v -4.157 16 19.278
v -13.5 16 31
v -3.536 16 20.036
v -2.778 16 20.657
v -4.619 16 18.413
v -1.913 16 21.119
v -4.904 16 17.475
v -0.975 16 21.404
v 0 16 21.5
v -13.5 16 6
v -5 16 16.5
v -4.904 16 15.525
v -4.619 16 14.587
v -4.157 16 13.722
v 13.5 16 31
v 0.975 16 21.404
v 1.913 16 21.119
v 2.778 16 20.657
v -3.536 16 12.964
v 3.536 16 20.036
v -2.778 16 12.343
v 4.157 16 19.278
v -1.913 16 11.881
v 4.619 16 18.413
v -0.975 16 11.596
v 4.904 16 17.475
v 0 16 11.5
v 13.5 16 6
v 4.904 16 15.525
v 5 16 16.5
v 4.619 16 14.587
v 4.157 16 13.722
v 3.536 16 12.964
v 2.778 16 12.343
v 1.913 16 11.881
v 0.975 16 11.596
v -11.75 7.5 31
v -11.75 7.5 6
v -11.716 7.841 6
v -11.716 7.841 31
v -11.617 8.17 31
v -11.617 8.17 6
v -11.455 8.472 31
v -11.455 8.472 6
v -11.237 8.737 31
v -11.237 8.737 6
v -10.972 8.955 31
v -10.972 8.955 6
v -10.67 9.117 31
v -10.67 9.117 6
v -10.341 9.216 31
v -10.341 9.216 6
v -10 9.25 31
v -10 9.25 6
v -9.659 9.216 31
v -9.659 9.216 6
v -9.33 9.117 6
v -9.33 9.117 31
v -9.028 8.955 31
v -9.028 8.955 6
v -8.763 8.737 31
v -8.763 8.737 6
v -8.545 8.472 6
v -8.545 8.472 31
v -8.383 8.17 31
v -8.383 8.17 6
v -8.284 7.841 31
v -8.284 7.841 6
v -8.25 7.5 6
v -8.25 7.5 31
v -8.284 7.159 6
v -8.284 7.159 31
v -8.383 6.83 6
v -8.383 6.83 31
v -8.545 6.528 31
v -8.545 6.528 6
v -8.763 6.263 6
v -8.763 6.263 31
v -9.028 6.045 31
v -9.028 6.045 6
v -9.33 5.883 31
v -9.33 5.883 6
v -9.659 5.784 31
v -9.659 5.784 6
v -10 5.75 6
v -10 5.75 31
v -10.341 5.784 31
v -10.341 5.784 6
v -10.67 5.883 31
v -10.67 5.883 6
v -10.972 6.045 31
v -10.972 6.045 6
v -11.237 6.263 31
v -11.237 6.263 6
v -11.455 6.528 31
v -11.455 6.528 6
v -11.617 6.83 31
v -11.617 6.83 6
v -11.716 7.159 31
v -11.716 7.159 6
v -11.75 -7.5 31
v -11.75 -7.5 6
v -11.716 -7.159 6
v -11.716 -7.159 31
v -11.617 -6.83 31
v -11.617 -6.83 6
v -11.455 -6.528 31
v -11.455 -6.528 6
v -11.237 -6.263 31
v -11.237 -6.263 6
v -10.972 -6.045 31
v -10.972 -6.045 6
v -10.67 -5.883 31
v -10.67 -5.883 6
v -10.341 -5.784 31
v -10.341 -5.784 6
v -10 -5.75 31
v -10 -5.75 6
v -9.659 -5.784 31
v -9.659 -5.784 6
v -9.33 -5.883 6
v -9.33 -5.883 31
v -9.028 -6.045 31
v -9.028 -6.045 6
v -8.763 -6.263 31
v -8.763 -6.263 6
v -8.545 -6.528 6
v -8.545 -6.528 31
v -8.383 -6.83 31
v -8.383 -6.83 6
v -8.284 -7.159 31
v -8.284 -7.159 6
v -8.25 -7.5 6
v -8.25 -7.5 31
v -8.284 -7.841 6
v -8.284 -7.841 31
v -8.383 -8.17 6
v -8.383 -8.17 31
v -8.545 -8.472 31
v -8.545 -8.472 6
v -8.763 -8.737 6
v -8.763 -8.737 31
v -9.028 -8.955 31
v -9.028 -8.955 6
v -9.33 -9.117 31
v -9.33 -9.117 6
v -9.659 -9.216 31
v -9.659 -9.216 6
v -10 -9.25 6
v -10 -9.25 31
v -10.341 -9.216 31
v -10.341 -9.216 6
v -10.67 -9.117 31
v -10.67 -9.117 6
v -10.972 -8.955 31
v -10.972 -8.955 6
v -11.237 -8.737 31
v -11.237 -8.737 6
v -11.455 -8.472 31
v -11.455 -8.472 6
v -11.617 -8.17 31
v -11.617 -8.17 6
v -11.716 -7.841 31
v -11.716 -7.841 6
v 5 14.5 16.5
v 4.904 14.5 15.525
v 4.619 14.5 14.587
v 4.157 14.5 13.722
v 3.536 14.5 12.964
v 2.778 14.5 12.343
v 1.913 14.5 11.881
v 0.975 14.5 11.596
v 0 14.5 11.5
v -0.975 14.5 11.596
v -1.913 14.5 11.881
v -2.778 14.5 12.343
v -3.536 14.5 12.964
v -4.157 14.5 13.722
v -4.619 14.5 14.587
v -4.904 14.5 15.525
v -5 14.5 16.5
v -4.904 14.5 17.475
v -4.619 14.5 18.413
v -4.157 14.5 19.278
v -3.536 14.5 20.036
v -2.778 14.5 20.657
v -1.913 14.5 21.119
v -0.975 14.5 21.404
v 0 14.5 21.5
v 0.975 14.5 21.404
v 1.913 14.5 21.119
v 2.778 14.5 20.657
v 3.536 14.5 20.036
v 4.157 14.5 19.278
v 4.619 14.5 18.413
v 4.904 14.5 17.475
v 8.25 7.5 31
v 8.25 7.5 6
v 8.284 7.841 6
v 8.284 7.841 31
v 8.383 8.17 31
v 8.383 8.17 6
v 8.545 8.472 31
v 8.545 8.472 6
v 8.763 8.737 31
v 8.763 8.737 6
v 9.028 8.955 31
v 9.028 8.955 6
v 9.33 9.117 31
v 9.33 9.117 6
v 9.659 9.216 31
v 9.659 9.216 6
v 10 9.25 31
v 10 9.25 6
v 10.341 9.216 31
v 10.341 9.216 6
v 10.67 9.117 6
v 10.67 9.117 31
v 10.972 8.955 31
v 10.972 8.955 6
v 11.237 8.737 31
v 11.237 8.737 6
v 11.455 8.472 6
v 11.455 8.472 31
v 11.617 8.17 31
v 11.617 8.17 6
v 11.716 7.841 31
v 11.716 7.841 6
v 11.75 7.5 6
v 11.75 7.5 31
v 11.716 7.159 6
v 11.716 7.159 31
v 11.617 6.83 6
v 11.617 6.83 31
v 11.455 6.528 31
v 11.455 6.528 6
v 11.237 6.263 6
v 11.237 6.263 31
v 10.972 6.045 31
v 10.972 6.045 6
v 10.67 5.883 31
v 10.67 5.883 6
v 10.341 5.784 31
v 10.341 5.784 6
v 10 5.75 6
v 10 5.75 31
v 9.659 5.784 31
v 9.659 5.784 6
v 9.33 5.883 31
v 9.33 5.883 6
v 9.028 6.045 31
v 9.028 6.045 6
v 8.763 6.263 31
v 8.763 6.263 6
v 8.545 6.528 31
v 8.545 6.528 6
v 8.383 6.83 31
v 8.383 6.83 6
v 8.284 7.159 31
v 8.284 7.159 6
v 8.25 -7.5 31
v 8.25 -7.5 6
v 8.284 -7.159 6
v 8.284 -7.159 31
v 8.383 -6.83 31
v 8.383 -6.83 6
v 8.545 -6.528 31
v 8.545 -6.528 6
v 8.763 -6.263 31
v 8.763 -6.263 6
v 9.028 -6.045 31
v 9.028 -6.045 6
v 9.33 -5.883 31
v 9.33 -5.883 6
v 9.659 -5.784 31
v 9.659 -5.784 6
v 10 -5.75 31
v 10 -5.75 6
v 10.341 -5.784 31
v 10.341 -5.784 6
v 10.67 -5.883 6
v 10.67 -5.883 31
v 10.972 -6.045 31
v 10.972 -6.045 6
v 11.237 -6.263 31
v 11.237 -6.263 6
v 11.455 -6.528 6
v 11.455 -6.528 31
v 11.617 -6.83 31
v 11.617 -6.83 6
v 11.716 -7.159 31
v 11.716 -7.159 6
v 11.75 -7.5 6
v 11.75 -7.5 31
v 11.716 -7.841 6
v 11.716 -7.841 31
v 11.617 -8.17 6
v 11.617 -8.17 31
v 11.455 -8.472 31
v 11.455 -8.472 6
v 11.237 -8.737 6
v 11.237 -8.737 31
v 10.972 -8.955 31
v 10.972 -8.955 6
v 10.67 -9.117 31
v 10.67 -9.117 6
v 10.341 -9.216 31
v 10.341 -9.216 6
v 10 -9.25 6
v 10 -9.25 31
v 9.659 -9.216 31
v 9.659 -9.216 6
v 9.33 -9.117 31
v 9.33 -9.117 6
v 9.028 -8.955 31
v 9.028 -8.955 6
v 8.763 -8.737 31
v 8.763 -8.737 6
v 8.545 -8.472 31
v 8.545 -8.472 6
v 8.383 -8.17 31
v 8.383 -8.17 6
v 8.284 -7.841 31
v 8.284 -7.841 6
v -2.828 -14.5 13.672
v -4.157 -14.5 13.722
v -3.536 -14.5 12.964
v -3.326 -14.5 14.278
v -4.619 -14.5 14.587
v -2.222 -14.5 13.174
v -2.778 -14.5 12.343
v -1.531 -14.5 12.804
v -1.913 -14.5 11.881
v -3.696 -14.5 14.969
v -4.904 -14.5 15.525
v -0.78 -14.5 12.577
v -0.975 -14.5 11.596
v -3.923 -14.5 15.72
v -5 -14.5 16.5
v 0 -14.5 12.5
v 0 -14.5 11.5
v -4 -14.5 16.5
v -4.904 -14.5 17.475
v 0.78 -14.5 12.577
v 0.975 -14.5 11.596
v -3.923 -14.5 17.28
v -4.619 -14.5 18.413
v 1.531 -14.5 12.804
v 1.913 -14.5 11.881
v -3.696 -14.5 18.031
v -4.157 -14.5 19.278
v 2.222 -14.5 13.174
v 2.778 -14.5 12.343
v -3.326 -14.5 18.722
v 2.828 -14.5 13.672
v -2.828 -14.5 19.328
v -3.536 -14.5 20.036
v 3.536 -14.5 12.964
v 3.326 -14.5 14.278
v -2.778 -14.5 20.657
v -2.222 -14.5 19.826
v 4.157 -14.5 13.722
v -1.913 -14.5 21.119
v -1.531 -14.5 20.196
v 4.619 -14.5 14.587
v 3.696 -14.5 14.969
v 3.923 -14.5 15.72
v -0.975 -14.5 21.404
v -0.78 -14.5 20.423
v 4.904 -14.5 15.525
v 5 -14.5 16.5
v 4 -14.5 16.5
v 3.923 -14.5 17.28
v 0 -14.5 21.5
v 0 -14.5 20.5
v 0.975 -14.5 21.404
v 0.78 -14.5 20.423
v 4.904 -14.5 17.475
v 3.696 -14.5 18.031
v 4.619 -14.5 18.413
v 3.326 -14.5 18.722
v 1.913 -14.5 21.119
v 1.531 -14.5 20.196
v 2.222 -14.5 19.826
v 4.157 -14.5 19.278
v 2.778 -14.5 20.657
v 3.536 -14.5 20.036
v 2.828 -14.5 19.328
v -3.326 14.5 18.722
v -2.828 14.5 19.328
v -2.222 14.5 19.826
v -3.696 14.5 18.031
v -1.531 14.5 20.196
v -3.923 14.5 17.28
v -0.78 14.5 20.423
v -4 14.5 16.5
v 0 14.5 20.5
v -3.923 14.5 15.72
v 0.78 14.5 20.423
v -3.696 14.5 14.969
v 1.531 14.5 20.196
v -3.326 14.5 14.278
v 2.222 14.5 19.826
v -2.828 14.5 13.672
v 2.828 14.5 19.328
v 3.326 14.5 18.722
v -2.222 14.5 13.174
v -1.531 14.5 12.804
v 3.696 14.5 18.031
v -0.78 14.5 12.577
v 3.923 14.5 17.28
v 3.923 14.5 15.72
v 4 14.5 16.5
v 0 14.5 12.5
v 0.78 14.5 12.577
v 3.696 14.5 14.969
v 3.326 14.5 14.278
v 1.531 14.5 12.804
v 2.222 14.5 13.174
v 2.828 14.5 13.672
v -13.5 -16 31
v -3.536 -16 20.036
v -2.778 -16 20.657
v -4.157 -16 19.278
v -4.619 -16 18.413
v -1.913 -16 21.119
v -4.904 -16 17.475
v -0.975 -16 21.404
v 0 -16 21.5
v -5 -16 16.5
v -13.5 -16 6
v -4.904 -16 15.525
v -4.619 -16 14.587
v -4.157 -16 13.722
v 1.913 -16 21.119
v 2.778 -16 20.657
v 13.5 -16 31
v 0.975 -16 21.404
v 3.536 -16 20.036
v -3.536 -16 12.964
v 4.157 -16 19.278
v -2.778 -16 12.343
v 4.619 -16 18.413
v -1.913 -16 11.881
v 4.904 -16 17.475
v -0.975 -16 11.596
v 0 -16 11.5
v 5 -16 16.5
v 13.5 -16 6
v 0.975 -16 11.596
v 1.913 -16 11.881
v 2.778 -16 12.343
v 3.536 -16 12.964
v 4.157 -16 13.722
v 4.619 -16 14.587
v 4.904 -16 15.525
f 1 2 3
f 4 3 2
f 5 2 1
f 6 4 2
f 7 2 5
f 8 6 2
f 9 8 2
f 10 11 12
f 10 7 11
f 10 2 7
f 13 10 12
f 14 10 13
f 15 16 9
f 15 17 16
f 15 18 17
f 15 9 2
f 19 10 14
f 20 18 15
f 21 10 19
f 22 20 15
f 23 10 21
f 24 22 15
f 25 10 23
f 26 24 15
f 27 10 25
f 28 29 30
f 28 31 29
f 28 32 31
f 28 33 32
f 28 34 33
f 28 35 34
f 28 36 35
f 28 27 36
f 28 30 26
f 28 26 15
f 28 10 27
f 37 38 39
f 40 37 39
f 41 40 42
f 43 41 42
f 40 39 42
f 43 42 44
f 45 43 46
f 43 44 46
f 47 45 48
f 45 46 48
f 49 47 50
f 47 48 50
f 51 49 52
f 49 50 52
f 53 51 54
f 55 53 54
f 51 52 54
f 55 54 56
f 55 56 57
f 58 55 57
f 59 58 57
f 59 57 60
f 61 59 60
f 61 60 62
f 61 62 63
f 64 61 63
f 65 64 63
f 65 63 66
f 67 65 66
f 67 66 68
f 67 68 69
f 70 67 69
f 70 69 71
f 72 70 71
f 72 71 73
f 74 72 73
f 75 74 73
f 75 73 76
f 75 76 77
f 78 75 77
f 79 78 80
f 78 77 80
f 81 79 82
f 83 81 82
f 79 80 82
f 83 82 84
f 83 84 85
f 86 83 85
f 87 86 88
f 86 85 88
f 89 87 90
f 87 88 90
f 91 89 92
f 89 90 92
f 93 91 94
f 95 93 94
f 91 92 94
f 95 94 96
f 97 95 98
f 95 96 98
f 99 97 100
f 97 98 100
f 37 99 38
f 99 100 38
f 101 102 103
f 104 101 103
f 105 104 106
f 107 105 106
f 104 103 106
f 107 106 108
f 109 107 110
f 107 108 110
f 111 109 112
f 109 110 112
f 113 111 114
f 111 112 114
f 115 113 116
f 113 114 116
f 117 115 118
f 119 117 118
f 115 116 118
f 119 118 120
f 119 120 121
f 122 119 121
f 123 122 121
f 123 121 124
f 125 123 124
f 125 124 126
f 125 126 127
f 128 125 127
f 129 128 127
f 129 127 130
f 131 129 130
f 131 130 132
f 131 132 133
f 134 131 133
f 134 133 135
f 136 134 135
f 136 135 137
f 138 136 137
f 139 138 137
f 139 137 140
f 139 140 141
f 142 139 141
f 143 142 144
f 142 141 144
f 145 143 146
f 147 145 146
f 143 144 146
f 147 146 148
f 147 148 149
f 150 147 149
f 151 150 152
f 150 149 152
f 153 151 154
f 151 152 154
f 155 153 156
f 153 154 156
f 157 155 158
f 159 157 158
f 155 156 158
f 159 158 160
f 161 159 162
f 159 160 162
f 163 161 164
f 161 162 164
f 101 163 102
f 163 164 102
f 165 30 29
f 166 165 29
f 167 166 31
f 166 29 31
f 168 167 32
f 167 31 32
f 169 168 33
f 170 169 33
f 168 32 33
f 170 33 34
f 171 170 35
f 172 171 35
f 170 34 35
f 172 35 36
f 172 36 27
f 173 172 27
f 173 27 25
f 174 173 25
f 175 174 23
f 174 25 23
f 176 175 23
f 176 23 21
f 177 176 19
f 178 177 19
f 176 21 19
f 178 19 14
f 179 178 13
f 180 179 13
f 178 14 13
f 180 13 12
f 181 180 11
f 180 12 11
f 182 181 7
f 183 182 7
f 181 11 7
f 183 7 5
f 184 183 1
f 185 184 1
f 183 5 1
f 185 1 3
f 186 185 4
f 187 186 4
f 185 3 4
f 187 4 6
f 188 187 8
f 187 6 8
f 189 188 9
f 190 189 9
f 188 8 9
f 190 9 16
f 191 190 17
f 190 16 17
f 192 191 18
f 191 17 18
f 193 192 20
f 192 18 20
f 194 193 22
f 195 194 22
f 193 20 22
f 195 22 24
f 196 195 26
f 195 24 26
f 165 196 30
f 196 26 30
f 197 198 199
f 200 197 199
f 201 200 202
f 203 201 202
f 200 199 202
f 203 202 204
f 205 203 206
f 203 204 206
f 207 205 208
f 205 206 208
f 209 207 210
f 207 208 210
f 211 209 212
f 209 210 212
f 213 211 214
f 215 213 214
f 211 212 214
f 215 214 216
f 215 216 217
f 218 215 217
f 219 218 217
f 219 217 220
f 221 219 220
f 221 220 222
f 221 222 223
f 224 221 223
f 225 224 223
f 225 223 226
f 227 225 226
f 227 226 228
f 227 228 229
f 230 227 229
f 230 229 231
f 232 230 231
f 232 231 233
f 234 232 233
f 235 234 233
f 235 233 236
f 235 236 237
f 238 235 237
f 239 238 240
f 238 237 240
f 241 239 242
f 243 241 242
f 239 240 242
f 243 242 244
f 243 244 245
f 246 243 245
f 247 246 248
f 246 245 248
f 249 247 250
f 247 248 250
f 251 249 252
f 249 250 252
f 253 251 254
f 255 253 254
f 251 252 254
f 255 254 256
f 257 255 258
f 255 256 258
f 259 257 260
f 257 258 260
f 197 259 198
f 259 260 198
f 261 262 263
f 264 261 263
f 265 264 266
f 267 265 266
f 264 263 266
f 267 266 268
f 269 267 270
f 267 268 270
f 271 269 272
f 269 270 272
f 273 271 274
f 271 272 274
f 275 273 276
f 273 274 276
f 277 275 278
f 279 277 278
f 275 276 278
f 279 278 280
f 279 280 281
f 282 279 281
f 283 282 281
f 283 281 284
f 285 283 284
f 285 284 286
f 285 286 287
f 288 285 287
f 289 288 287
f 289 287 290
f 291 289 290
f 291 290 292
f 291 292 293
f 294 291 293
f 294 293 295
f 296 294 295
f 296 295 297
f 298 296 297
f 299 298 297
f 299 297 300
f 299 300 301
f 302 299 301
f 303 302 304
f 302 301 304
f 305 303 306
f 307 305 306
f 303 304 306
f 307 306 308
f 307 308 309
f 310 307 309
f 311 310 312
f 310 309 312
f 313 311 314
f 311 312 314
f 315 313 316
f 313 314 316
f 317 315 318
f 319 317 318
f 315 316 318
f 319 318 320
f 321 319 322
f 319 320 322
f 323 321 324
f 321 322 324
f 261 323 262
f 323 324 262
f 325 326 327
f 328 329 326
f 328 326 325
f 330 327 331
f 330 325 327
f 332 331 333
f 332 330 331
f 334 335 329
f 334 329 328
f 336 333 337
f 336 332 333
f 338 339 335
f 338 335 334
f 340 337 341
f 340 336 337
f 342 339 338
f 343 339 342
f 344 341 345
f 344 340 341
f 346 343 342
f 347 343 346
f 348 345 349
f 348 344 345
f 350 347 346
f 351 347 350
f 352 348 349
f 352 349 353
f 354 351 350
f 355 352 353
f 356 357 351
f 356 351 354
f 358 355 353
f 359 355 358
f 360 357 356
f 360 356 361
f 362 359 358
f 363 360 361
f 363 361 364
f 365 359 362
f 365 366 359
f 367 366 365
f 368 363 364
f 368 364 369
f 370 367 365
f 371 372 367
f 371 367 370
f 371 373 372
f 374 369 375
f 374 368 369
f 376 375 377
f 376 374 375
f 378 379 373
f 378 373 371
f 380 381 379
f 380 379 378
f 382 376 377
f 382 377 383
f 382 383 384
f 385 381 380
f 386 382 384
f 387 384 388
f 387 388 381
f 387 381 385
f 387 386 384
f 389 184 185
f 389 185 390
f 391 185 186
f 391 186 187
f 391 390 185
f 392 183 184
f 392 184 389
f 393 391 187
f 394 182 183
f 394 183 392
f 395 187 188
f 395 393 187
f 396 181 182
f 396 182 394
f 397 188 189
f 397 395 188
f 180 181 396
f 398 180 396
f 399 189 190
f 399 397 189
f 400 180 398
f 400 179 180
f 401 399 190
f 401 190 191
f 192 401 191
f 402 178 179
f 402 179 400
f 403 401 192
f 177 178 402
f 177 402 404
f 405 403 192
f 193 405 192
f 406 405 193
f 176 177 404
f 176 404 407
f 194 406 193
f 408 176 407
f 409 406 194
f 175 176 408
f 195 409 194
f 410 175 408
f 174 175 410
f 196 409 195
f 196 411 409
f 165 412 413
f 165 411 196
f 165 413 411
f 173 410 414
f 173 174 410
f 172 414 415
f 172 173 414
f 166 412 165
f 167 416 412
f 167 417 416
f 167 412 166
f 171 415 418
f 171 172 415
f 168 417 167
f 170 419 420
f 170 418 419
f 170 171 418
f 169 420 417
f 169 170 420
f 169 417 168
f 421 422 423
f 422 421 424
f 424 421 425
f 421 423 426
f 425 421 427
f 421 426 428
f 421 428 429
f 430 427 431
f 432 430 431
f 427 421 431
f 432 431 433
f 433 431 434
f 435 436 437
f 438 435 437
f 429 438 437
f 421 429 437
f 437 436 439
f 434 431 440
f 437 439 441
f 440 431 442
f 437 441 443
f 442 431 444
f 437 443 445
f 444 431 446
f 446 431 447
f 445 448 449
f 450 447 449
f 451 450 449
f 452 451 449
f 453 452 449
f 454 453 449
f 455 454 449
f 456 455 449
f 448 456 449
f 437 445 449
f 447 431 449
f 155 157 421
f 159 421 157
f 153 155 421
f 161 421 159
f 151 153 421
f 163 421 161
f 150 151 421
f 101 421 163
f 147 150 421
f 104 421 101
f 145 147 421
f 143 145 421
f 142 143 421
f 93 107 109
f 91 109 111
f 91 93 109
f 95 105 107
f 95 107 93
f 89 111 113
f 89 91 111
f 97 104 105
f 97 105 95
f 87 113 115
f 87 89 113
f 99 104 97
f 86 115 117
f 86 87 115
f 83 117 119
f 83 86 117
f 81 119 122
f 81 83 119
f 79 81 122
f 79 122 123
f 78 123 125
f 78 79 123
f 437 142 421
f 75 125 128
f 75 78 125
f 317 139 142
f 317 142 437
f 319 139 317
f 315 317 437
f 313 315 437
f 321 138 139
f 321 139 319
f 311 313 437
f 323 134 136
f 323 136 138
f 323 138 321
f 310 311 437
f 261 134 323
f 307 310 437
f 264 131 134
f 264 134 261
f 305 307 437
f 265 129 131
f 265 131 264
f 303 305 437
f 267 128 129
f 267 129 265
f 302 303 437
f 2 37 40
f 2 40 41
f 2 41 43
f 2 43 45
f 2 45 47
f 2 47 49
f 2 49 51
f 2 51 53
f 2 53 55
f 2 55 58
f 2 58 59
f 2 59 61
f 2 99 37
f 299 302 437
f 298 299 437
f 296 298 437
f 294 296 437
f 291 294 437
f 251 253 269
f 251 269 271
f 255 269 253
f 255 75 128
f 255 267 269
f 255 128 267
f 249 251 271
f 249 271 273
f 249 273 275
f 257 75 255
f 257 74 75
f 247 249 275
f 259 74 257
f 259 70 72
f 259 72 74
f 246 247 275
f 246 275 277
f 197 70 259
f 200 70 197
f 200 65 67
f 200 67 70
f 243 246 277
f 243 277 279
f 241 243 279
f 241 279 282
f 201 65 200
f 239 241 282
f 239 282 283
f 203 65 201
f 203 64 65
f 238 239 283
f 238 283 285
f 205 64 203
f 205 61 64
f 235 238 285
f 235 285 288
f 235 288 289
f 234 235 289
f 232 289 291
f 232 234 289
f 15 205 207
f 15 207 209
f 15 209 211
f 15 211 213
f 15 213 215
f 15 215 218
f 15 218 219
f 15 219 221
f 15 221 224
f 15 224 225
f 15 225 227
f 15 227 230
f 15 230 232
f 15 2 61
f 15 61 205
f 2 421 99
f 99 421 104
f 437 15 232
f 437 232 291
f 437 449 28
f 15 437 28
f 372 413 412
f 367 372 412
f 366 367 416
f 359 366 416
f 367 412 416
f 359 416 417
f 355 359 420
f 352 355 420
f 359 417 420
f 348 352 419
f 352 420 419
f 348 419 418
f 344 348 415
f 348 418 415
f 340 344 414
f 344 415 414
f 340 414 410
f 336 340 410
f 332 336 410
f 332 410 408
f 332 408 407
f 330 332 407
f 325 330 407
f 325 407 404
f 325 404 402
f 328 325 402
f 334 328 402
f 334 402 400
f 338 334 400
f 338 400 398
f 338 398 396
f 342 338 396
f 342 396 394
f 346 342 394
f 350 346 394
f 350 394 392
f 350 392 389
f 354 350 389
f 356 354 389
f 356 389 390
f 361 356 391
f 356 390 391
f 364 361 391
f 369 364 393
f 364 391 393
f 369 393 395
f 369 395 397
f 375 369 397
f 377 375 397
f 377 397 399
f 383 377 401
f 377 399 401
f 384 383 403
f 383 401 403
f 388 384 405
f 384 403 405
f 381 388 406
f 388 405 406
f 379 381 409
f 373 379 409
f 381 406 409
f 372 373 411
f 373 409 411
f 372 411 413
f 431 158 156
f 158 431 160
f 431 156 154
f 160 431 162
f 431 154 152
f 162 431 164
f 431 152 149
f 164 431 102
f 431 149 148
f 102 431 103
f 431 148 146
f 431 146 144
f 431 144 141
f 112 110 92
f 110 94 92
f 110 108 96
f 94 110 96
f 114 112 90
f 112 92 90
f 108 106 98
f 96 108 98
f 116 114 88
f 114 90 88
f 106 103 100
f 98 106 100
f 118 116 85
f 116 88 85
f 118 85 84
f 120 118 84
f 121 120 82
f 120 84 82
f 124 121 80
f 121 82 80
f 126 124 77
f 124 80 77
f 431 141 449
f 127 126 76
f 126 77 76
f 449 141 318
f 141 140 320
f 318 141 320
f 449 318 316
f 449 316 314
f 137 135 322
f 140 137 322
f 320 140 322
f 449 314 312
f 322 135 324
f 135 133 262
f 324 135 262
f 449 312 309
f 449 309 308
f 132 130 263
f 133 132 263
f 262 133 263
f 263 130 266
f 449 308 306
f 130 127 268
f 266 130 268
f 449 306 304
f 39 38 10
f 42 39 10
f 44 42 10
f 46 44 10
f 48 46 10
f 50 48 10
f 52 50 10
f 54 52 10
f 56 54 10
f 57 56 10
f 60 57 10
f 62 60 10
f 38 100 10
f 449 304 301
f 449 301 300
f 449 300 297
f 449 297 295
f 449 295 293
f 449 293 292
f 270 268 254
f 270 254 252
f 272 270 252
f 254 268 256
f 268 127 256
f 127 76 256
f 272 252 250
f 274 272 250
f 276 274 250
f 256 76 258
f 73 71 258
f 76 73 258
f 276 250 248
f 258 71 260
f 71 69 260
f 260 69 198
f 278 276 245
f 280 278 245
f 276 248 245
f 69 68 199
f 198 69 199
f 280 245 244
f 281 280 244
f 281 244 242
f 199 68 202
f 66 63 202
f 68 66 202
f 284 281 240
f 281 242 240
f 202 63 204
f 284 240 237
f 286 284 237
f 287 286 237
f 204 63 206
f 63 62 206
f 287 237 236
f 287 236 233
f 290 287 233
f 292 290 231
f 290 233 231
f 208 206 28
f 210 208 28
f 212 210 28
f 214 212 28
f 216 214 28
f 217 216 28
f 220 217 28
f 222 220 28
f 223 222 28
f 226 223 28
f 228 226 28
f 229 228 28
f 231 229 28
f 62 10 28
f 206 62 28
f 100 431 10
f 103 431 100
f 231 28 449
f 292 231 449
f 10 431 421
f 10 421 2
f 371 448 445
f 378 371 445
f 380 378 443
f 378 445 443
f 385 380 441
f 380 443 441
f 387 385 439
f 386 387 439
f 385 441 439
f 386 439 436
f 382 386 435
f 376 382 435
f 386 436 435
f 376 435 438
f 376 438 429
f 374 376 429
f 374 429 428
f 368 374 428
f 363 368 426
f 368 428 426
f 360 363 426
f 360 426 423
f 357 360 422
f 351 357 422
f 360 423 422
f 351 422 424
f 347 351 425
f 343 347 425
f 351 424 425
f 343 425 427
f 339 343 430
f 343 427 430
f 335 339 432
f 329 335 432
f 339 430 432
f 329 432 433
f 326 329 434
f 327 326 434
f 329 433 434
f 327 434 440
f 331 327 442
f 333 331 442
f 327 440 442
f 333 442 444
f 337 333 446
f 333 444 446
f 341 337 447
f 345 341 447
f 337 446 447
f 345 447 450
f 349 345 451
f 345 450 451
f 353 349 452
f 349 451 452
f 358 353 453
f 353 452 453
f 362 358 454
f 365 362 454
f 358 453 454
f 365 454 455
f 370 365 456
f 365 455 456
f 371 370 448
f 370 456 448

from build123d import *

# Parameters (mm, degrees)
SCHIZZO1_W                   = 27
SCHIZZO1_H                   = 32
ESTRUSIONE_ESTRUSIONE1_DEPTH = 31
SCHIZZO2_R                   = 1.75
TAGLIO_ESTRUSIONE1_DEPTH     = 32
SCHIZZO8_OUTSIDE_W           = 39.42
SCHIZZO8_OUTSIDE_H           = 43.42
SCHIZZO8_OUTSIDE_W_2         = 27
SCHIZZO8_OUTSIDE_H_2         = 25
TAGLIO_ESTRUSIONE7_DEPTH     = 33
SCHIZZO10_R                  = 5
TAGLIO_ESTRUSIONE8_DEPTH     = 1.5
SCHIZZO11_R                  = 4
TAGLIO_ESTRUSIONE9_DEPTH     = 33
SCHIZZO12_R                  = 5
TAGLIO_ESTRUSIONE10_DEPTH    = 1.5


with BuildPart() as part:
    # Schizzo1 → Estrusione-Estrusione1 (new body)
    with BuildSketch(Plane.XY):
        Rectangle(SCHIZZO1_W, SCHIZZO1_H)
    extrude(amount=ESTRUSIONE_ESTRUSIONE1_DEPTH)

    # Schizzo2 → Taglio-Estrusione1 (cut, through all)
    with BuildSketch(Plane(origin=(0, 0, 0), x_dir=(-1, 0, 0), z_dir=(0, 0, -1))):
        with Locations((-10, 7.5)):
            Circle(SCHIZZO2_R)
        with Locations((10, 7.5)):
            Circle(SCHIZZO2_R)
        with Locations((10, -7.5)):
            Circle(SCHIZZO2_R)
        with Locations((-10, -7.5)):
            Circle(SCHIZZO2_R)
    extrude(amount=-TAGLIO_ESTRUSIONE1_DEPTH, mode=Mode.SUBTRACT)

    # Schizzo8 outside → Taglio-Estrusione7 (cut, through all)
    with BuildSketch(Plane(origin=(0, 16, 0), x_dir=(1, 0, 0), z_dir=(0, 1, 0))):
        with Locations((0, -15.5)):
            Rectangle(SCHIZZO8_OUTSIDE_W, SCHIZZO8_OUTSIDE_H)
        with Locations((0, -18.5)):
            Rectangle(SCHIZZO8_OUTSIDE_W_2, SCHIZZO8_OUTSIDE_H_2, mode=Mode.SUBTRACT)
    extrude(amount=-TAGLIO_ESTRUSIONE7_DEPTH, mode=Mode.SUBTRACT)

    # Schizzo10 → Taglio-Estrusione8 (cut)
    with BuildSketch(Plane(origin=(0, 16, 0), x_dir=(1, 0, 0), z_dir=(0, 1, 0))):
        with Locations((0, -16.5)):
            Circle(SCHIZZO10_R)
    extrude(amount=-TAGLIO_ESTRUSIONE8_DEPTH, mode=Mode.SUBTRACT)

    # Schizzo11 → Taglio-Estrusione9 (cut, through all)
    with BuildSketch(Plane(origin=(0, 16, 0), x_dir=(1, 0, 0), z_dir=(0, 1, 0))):
        with Locations((0, -16.5)):
            Circle(SCHIZZO11_R)
    extrude(amount=-TAGLIO_ESTRUSIONE9_DEPTH, mode=Mode.SUBTRACT)

    # Schizzo12 → Taglio-Estrusione10 (cut)
    with BuildSketch(Plane.XZ.offset(16)):
        with Locations((0, 16.5)):
            Circle(SCHIZZO12_R)
    extrude(amount=-TAGLIO_ESTRUSIONE10_DEPTH, mode=Mode.SUBTRACT)


solid = part.part
